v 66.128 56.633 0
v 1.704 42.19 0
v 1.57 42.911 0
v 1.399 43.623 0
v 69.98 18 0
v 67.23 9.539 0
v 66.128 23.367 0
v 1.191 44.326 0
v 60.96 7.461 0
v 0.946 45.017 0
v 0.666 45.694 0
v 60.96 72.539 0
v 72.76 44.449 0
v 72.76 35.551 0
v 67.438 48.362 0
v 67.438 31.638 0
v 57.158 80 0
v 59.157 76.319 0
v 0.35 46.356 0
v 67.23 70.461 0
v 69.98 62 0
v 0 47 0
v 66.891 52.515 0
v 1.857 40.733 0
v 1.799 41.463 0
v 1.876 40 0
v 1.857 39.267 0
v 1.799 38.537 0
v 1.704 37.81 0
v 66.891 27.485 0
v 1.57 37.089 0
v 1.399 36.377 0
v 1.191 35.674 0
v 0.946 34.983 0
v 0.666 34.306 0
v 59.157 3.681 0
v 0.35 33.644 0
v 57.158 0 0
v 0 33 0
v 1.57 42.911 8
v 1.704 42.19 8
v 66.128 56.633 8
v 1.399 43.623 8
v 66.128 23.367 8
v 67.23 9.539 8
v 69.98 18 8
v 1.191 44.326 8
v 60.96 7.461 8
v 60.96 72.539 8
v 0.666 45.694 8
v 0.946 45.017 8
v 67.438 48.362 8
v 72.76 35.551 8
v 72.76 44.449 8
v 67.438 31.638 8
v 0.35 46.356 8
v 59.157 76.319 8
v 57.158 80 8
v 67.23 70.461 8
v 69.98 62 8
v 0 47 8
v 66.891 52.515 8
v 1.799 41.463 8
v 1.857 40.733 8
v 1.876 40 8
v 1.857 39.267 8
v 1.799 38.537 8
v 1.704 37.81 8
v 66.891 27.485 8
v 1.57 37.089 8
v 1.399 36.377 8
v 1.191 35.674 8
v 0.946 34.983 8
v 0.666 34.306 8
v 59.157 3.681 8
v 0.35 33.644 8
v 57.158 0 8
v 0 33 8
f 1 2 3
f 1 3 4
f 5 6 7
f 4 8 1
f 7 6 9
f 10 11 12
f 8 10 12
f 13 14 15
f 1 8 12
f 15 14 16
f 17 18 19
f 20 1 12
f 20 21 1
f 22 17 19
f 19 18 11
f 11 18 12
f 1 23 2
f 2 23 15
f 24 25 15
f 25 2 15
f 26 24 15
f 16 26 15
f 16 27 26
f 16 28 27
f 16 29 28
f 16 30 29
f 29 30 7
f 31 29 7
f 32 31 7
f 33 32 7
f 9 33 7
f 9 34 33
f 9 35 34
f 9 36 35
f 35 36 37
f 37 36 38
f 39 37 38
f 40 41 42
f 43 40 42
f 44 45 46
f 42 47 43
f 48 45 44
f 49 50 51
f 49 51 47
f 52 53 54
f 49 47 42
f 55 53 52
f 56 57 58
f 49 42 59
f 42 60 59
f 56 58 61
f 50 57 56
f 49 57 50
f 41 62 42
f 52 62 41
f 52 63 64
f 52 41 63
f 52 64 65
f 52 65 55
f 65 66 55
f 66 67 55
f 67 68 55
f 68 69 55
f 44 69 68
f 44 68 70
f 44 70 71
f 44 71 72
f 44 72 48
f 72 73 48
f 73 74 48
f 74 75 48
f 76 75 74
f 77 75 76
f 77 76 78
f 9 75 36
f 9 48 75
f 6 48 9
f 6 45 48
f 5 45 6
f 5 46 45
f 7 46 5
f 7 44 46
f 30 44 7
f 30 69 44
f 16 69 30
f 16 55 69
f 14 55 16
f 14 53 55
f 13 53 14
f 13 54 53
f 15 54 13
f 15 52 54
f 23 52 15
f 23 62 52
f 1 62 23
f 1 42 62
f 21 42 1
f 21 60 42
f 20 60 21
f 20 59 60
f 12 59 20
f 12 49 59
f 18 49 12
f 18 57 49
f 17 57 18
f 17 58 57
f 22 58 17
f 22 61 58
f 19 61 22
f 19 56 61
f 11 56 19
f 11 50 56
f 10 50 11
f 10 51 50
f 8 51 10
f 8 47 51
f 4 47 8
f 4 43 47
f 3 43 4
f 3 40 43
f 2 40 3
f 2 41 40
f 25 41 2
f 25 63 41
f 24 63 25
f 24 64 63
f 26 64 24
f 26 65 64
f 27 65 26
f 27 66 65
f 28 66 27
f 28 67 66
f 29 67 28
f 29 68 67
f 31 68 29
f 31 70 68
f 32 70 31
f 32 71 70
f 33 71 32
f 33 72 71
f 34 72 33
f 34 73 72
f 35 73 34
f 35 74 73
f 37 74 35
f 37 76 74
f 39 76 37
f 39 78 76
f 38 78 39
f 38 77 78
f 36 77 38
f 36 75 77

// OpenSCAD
$fn = 32;

// ----------------------------------------------------------------------
// Gear sector: 3 teeth on 60 degrees
// ----------------------------------------------------------------------

// --- parameters (mm) ---
sector_angle = 60;        // sector angle, degrees
root_r = 80;              // root circle radius
tooth_h = 5;              // tooth height over the root circle
teeth = 3;                // number of teeth on the sector
hub_r = 14;               // hub bore radius
plate_t = 8;              // sector thickness, Z
arc_step = 3;             // sampling step of the root/hub arcs, degrees
fit_tol = 0.05;           // declared fit tolerance (prompt contract)
free_tol = 0.3;           // declared free tolerance (prompt contract)

tip_r = root_r + tooth_h;  // tip circle radius

profile = [[57.158, 0], [59.157, 3.681], [60.96, 7.461], [67.23, 9.539], [69.98, 18], [66.128, 23.367], [66.891, 27.485], [67.438, 31.638], [72.76, 35.551], [72.76, 44.449], [67.438, 48.362], [66.891, 52.515], [66.128, 56.633], [69.98, 62], [67.23, 70.461], [60.96, 72.539], [59.157, 76.319], [57.158, 80], [0, 47], [0.35, 46.356], [0.666, 45.694], [0.946, 45.017], [1.191, 44.326], [1.399, 43.623], [1.57, 42.911], [1.704, 42.19], [1.799, 41.463], [1.857, 40.733], [1.876, 40], [1.857, 39.267], [1.799, 38.537], [1.704, 37.81], [1.57, 37.089], [1.399, 36.377], [1.191, 35.674], [0.946, 34.983], [0.666, 34.306], [0.35, 33.644], [0, 33]];  // primary outline, 39 points, counter clockwise

// --- the one profile operation ---
linear_extrude(height = plate_t) polygon(points = profile);
